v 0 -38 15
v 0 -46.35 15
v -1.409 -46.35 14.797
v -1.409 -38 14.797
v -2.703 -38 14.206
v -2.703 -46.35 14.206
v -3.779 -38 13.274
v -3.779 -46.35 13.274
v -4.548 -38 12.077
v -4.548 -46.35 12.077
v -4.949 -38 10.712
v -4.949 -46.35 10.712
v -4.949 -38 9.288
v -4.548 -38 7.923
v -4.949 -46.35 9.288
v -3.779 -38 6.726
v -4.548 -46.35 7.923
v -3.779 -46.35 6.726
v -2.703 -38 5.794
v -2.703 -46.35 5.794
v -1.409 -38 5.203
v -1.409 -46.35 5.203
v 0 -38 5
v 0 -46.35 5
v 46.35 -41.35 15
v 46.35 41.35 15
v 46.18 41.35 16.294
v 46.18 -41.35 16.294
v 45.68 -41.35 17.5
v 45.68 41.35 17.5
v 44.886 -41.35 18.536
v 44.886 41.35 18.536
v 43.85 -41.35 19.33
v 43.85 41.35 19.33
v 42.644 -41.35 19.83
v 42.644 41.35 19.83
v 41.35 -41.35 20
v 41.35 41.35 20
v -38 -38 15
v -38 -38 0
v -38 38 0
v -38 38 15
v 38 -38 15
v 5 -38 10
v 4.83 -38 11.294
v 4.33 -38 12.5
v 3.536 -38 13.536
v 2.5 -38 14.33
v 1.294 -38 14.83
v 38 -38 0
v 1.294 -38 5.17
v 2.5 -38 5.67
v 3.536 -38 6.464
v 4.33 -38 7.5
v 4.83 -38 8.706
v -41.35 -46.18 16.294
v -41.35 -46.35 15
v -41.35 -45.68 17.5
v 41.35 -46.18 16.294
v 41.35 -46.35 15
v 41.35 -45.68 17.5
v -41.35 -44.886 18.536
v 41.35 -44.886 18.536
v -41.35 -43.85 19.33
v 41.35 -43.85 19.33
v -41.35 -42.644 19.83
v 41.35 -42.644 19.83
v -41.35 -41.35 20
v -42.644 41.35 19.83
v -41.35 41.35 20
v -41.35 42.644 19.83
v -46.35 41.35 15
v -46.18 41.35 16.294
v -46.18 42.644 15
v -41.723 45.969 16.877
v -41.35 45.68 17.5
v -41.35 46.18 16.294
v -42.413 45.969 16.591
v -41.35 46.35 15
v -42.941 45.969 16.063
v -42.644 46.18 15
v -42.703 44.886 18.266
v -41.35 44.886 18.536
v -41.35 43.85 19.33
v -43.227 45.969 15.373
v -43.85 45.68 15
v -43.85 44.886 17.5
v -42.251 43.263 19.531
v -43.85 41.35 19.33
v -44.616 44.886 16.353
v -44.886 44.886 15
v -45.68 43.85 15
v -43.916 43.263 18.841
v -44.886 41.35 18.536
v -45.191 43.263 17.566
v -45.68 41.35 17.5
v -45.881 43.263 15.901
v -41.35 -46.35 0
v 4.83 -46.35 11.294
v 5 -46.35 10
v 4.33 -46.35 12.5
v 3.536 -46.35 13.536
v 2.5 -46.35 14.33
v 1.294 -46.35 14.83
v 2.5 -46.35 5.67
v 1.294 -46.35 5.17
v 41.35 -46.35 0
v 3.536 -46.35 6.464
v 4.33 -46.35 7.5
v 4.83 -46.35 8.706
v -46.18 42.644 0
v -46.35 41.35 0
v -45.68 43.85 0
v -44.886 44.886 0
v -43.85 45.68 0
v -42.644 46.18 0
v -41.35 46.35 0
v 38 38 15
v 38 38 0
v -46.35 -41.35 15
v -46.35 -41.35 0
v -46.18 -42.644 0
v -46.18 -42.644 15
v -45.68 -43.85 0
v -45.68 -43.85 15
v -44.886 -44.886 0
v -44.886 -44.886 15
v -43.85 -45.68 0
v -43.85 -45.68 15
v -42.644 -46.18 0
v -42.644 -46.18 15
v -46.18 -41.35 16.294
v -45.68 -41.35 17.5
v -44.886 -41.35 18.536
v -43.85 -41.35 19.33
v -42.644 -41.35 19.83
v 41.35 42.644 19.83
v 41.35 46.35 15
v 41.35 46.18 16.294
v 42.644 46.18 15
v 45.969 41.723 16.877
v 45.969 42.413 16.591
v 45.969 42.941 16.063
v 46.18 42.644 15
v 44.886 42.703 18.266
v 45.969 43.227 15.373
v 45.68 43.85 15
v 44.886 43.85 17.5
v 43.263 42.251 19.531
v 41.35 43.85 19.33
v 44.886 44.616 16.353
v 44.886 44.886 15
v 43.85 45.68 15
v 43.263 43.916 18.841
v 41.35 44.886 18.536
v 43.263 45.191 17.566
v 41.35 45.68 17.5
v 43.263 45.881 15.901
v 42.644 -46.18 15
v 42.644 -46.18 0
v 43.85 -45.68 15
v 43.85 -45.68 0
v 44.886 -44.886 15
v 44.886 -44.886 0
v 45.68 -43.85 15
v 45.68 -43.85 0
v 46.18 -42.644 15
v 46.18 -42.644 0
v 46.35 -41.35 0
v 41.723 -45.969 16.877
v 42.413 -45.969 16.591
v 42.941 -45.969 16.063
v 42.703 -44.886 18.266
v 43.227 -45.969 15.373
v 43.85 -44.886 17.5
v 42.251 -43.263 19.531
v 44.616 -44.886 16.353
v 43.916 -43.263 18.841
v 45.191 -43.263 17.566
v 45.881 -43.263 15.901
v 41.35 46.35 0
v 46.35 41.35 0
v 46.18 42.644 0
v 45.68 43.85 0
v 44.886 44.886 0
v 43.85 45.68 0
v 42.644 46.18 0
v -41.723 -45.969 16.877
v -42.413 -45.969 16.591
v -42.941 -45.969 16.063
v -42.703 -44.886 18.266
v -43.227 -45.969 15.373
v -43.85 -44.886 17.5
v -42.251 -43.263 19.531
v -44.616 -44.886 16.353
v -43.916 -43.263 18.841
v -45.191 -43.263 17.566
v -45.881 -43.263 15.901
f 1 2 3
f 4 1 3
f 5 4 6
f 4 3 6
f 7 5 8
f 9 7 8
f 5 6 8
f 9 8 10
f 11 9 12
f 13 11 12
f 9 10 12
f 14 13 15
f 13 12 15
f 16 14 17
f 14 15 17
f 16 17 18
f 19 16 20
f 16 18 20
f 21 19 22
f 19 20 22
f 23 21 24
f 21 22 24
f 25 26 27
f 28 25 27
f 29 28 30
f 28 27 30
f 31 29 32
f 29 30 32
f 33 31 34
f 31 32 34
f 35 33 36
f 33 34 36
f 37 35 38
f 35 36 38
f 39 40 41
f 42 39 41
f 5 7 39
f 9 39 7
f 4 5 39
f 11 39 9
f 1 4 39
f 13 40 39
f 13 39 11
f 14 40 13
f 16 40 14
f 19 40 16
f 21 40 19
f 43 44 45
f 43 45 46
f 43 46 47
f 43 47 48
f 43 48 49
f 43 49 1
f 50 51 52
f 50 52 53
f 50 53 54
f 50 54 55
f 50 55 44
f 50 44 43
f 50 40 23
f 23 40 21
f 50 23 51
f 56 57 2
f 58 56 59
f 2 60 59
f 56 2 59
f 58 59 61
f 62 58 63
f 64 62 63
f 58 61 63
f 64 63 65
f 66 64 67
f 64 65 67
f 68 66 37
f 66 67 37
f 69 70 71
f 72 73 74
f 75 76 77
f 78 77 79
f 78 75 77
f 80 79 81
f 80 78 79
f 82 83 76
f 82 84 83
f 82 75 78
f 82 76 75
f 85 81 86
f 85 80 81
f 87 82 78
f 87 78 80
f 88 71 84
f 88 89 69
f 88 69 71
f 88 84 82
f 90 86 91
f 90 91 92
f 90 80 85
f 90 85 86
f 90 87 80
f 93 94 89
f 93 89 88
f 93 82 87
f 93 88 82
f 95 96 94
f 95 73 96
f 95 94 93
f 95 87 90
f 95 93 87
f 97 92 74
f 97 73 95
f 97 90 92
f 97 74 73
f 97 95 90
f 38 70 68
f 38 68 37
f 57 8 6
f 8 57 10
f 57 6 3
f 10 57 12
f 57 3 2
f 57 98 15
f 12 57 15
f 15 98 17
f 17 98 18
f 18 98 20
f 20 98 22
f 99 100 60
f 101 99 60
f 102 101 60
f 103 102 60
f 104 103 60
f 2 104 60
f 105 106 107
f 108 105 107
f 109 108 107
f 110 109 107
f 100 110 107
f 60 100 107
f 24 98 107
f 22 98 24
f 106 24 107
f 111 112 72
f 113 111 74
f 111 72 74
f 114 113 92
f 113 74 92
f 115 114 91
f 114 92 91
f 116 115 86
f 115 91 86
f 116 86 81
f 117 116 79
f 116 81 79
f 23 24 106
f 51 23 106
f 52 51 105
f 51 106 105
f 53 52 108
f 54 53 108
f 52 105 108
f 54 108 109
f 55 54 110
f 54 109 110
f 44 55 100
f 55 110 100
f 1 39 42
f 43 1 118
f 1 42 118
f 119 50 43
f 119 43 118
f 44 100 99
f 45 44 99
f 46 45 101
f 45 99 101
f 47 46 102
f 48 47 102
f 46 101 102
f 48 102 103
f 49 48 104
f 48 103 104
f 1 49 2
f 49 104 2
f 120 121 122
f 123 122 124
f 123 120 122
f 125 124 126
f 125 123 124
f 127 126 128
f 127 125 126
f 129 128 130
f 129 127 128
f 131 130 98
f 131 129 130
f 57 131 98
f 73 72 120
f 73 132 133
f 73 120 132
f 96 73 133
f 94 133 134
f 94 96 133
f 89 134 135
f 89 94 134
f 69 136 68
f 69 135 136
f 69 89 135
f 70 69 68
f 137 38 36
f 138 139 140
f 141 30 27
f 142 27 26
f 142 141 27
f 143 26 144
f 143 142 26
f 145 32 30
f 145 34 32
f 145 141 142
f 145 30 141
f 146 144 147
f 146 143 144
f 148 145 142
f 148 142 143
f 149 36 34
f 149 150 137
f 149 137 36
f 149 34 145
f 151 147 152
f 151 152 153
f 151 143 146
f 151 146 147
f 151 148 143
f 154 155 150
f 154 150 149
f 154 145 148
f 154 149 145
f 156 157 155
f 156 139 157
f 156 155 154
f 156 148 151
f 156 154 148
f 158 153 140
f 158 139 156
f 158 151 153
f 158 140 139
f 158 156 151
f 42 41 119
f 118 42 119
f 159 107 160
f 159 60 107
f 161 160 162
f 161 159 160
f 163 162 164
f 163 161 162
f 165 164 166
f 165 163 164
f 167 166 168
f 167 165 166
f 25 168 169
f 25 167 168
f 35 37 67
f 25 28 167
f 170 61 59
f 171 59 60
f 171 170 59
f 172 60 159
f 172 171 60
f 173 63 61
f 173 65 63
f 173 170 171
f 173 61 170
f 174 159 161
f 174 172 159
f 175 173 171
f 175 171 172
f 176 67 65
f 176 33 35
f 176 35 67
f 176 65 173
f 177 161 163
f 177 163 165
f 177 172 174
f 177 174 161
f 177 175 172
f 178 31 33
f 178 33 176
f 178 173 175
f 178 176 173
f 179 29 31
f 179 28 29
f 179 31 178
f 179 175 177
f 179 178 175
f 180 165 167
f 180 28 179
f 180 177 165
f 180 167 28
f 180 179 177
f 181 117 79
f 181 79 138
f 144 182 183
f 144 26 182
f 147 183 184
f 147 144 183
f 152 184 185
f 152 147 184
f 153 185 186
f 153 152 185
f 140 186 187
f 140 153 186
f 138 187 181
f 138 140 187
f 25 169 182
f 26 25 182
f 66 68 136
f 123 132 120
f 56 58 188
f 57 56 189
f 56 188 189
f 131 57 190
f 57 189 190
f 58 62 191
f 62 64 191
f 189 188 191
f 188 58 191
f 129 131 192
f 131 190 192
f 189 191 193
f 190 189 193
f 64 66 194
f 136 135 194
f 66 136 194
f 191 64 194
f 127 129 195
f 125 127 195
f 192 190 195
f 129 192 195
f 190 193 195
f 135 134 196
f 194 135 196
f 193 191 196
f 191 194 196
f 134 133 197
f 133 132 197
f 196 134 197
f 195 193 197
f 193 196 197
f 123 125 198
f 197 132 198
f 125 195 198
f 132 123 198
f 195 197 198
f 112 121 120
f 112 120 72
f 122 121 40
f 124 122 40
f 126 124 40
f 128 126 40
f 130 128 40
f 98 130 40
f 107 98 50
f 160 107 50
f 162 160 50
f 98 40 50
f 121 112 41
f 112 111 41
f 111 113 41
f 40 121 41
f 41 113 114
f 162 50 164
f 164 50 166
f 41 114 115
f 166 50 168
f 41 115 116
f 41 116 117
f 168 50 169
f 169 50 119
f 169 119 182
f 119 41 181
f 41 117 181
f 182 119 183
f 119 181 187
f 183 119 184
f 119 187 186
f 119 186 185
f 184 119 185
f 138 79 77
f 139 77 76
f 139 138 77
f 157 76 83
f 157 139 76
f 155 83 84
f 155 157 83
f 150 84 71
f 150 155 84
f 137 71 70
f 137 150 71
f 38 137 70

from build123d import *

# Parameters (mm, degrees)
F0_W     = 92.7
F0_H     = 92.7
F0_W_2   = 76
F0_H_2   = 76
F1_DEPTH = 20
F2_R     = 5
F4_DEPTH = 15
F5_DEPTH = 8.35


with BuildPart() as f1:
    # F0 (on Top) → F1 (new body)
    with BuildSketch(Plane.XY):
        Rectangle(F0_W, F0_H)
        Rectangle(F0_W_2, F0_H_2, mode=Mode.SUBTRACT)
        Rectangle(F0_W_2, F0_H_2)
    extrude(amount=F1_DEPTH)

    # F2
    f2_edges = [f1.edges().sort_by_distance(p)[0] for p in [
        (-46.35, 0, 20),
        (0, 46.35, 20),
        (46.35, 0, 20),
        (0, -46.35, 20),
        (46.35, -46.35, 10),
        (-46.35, -46.35, 10),
        (46.35, 46.35, 10),
        (-46.35, 46.35, 10),
    ]]
    fillet(f2_edges, radius=F2_R)

    # F0 (on Top) → F4 (cut)
    with BuildSketch(Plane.XY):
        Rectangle(F0_W_2, F0_H_2)
    extrude(amount=F4_DEPTH, mode=Mode.SUBTRACT)

    # F3 (on face) → F5 (cut, through all)
    with BuildSketch(Plane.XZ.offset(46.35)):
        with BuildLine():
            ThreePointArc((0, 15), (-5, 10), (0, 5))
            ThreePointArc((0, 5), (3.535534, 6.464466), (5, 10))
            ThreePointArc((5, 10), (3.535534, 13.535534), (0, 15))
        make_face()
    extrude(amount=-F5_DEPTH, mode=Mode.SUBTRACT)


solid = f1.part
